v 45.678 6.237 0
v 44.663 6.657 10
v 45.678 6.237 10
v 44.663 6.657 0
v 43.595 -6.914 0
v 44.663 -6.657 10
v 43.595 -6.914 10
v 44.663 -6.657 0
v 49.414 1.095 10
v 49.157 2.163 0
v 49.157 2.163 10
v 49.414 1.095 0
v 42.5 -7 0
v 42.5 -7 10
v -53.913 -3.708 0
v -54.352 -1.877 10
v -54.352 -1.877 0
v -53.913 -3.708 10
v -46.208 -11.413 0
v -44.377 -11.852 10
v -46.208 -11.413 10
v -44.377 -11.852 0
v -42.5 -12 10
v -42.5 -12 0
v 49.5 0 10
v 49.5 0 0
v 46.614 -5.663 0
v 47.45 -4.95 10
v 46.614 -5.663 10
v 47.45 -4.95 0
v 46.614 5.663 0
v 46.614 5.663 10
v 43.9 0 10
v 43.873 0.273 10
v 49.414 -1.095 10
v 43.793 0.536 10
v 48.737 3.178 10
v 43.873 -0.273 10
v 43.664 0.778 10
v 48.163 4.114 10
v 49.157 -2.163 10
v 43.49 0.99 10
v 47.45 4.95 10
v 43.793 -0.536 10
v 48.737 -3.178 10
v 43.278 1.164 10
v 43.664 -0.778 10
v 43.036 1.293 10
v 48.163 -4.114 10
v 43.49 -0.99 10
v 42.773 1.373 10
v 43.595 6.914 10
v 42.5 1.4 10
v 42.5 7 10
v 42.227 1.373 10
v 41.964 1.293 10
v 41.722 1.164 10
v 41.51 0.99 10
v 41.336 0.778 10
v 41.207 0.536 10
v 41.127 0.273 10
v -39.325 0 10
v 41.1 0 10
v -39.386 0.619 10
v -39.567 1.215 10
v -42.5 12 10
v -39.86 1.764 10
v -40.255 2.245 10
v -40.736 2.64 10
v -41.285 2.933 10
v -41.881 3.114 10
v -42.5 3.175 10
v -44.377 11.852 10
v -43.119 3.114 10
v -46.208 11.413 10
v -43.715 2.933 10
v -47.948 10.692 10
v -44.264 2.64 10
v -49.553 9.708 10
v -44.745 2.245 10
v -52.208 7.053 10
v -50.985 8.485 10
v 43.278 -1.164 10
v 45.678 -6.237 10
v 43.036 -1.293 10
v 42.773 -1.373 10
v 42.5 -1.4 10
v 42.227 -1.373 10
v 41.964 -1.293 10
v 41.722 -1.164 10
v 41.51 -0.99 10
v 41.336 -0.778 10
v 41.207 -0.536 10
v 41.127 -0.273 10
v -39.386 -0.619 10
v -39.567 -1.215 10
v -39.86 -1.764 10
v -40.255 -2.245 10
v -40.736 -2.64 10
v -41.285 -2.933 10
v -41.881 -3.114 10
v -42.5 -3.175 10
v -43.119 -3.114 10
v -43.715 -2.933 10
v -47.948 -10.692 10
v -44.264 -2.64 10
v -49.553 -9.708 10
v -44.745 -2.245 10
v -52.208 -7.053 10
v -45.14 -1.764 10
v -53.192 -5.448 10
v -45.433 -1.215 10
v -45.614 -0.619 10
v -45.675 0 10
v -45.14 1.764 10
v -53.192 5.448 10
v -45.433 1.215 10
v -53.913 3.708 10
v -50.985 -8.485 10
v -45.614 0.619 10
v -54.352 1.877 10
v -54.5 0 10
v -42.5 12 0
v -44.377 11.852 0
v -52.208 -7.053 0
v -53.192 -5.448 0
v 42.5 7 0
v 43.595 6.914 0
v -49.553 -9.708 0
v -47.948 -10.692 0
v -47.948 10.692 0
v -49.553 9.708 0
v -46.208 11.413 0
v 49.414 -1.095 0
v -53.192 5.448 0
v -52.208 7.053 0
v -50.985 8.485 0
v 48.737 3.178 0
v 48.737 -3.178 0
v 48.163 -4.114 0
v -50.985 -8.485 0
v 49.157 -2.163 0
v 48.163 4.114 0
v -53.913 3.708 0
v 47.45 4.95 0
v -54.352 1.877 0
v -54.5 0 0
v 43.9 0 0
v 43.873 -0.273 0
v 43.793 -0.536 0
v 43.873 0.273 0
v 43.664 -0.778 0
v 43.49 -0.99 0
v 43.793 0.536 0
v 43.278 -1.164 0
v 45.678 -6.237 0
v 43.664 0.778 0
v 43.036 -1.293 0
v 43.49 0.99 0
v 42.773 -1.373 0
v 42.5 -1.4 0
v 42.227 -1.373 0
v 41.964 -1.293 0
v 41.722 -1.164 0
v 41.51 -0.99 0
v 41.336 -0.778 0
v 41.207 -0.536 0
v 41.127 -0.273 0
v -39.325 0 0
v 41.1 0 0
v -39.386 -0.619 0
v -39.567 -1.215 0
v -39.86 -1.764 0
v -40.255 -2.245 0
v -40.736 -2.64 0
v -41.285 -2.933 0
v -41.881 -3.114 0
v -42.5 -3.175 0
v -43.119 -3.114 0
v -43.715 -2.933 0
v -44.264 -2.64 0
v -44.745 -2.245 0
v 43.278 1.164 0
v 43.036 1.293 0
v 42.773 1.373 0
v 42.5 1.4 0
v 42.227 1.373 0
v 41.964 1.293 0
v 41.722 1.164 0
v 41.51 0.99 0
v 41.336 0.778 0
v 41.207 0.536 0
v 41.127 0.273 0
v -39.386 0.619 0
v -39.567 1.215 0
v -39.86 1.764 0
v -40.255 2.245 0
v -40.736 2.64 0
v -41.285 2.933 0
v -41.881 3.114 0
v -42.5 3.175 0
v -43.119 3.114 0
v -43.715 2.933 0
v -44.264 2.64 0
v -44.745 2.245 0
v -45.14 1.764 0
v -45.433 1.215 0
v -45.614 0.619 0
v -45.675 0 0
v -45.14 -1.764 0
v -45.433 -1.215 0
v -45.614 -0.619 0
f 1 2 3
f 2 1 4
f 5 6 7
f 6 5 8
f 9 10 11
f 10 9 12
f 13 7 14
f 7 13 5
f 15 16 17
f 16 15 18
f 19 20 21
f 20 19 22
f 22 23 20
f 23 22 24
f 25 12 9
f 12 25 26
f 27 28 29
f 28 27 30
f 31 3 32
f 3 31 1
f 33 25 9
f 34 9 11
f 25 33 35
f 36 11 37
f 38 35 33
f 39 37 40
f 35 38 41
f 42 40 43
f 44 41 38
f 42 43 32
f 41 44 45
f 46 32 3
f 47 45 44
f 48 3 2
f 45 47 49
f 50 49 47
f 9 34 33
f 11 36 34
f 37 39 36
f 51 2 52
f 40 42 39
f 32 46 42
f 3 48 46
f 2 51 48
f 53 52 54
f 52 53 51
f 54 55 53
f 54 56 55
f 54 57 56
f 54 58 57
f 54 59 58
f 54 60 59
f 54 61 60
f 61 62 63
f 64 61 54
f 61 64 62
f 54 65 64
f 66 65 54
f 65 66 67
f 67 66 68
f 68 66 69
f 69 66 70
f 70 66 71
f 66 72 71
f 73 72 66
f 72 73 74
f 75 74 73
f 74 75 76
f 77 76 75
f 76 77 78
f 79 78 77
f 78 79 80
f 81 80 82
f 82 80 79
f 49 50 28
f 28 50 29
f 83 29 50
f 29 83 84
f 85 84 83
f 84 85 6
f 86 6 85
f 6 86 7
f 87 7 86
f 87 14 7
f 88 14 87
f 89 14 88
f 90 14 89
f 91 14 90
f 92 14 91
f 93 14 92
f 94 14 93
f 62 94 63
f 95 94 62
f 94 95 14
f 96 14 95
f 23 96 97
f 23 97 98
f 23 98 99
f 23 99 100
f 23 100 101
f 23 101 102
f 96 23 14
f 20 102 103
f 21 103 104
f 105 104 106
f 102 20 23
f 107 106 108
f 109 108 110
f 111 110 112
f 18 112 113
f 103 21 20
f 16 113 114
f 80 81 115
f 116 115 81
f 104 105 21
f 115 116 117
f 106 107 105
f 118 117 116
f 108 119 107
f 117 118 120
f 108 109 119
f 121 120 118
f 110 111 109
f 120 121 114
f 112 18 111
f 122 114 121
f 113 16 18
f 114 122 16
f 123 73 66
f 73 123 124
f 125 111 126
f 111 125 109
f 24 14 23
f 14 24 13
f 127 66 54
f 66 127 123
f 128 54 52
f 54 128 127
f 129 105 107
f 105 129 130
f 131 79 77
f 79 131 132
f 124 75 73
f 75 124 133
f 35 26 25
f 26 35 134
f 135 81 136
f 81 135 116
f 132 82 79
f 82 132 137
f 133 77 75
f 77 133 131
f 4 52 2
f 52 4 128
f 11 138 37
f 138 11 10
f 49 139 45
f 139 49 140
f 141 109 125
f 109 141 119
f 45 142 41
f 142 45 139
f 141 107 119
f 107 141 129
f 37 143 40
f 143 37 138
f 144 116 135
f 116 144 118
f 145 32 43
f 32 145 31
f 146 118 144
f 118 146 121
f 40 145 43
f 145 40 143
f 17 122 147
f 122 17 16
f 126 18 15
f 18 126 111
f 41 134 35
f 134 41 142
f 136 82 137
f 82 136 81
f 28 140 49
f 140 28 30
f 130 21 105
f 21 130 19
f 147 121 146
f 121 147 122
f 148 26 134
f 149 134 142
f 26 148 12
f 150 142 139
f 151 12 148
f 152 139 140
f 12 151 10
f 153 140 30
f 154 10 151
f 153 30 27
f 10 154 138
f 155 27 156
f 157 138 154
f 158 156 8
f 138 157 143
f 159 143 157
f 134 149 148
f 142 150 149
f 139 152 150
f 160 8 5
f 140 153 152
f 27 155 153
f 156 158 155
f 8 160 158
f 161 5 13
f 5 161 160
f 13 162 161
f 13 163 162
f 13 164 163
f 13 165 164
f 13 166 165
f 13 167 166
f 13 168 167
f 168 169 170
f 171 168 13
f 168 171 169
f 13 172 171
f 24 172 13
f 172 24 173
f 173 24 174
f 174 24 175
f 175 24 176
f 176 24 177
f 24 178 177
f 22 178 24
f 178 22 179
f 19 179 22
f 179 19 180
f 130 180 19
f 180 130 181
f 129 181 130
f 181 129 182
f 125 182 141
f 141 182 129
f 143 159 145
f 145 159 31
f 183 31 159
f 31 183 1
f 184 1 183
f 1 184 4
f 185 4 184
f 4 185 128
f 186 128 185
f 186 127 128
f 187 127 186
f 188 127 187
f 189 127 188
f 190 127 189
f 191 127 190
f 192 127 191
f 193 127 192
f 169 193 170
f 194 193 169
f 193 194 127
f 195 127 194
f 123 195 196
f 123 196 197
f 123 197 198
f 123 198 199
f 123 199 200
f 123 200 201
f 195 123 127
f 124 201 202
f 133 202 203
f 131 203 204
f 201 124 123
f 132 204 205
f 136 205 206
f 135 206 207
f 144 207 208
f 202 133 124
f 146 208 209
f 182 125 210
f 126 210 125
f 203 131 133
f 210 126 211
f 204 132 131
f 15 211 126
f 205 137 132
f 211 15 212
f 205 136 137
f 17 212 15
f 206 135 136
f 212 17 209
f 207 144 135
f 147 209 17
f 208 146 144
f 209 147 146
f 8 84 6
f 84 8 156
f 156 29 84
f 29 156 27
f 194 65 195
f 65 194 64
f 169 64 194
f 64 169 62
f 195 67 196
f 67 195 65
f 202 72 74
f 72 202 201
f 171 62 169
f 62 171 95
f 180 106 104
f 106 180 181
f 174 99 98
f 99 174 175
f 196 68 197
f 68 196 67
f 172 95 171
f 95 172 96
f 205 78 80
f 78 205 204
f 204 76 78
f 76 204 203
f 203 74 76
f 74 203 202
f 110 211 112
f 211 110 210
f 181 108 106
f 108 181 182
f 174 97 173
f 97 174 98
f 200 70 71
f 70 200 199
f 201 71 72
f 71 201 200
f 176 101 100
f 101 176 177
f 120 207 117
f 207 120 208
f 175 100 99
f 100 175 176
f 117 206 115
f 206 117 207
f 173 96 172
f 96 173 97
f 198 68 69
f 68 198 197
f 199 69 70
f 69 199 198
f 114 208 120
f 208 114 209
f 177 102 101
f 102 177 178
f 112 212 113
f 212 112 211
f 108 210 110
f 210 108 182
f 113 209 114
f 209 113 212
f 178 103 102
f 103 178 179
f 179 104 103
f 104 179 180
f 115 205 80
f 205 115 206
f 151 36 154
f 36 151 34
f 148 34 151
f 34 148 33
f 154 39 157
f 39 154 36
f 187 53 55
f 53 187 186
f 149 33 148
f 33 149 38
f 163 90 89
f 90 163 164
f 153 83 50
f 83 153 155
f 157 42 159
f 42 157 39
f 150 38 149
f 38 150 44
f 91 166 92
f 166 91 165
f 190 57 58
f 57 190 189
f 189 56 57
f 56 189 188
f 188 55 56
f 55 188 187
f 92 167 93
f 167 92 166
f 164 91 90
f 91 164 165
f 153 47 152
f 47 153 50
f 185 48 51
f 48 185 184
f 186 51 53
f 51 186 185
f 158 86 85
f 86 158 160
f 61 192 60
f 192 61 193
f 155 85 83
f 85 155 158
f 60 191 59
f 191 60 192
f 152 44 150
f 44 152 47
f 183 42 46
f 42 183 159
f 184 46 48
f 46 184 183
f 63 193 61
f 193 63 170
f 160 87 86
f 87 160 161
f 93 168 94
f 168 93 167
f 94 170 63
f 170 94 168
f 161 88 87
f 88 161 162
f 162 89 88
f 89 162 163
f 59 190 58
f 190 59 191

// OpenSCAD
$fn = 32;

// ----------------------------------------------------------------------
// Lever: 85 mm between the bosses, 10 mm thick, smooth outline
// ----------------------------------------------------------------------

// --- parameters (mm) ---
lever_l = 85;             // distance between the boss centres
boss_a = 24;              // first boss diameter
boss_b = 14;              // second boss diameter
bore_a = 6.35;            // first bore
bore_b = 2.8;             // second bore
lever_t = 10;             // lever thickness

lever_profile = [[-54.5, 0], [-54.352, -1.877], [-53.913, -3.708], [-53.192, -5.448], [-52.208, -7.053], [-50.985, -8.485], [-49.553, -9.708], [-47.948, -10.692], [-46.208, -11.413], [-44.377, -11.852], [-42.5, -12], [42.5, -7], [43.595, -6.914], [44.663, -6.657], [45.678, -6.237], [46.614, -5.663], [47.45, -4.95], [48.163, -4.114], [48.737, -3.178], [49.157, -2.163], [49.414, -1.095], [49.5, 0], [49.414, 1.095], [49.157, 2.163], [48.737, 3.178], [48.163, 4.114], [47.45, 4.95], [46.614, 5.663], [45.678, 6.237], [44.663, 6.657], [43.595, 6.914], [42.5, 7], [-42.5, 12], [-44.377, 11.852], [-46.208, 11.413], [-47.948, 10.692], [-49.553, 9.708], [-50.985, 8.485], [-52.208, 7.053], [-53.192, 5.448], [-53.913, 3.708], [-54.352, 1.877]];

difference() {
  linear_extrude(height = lever_t) polygon(lever_profile);
  translate([-42.5, 0, -2.5]) cylinder(h = lever_t + 5, d = bore_a);
  translate([42.5, 0, -2.5]) cylinder(h = lever_t + 5, d = bore_b);
}
